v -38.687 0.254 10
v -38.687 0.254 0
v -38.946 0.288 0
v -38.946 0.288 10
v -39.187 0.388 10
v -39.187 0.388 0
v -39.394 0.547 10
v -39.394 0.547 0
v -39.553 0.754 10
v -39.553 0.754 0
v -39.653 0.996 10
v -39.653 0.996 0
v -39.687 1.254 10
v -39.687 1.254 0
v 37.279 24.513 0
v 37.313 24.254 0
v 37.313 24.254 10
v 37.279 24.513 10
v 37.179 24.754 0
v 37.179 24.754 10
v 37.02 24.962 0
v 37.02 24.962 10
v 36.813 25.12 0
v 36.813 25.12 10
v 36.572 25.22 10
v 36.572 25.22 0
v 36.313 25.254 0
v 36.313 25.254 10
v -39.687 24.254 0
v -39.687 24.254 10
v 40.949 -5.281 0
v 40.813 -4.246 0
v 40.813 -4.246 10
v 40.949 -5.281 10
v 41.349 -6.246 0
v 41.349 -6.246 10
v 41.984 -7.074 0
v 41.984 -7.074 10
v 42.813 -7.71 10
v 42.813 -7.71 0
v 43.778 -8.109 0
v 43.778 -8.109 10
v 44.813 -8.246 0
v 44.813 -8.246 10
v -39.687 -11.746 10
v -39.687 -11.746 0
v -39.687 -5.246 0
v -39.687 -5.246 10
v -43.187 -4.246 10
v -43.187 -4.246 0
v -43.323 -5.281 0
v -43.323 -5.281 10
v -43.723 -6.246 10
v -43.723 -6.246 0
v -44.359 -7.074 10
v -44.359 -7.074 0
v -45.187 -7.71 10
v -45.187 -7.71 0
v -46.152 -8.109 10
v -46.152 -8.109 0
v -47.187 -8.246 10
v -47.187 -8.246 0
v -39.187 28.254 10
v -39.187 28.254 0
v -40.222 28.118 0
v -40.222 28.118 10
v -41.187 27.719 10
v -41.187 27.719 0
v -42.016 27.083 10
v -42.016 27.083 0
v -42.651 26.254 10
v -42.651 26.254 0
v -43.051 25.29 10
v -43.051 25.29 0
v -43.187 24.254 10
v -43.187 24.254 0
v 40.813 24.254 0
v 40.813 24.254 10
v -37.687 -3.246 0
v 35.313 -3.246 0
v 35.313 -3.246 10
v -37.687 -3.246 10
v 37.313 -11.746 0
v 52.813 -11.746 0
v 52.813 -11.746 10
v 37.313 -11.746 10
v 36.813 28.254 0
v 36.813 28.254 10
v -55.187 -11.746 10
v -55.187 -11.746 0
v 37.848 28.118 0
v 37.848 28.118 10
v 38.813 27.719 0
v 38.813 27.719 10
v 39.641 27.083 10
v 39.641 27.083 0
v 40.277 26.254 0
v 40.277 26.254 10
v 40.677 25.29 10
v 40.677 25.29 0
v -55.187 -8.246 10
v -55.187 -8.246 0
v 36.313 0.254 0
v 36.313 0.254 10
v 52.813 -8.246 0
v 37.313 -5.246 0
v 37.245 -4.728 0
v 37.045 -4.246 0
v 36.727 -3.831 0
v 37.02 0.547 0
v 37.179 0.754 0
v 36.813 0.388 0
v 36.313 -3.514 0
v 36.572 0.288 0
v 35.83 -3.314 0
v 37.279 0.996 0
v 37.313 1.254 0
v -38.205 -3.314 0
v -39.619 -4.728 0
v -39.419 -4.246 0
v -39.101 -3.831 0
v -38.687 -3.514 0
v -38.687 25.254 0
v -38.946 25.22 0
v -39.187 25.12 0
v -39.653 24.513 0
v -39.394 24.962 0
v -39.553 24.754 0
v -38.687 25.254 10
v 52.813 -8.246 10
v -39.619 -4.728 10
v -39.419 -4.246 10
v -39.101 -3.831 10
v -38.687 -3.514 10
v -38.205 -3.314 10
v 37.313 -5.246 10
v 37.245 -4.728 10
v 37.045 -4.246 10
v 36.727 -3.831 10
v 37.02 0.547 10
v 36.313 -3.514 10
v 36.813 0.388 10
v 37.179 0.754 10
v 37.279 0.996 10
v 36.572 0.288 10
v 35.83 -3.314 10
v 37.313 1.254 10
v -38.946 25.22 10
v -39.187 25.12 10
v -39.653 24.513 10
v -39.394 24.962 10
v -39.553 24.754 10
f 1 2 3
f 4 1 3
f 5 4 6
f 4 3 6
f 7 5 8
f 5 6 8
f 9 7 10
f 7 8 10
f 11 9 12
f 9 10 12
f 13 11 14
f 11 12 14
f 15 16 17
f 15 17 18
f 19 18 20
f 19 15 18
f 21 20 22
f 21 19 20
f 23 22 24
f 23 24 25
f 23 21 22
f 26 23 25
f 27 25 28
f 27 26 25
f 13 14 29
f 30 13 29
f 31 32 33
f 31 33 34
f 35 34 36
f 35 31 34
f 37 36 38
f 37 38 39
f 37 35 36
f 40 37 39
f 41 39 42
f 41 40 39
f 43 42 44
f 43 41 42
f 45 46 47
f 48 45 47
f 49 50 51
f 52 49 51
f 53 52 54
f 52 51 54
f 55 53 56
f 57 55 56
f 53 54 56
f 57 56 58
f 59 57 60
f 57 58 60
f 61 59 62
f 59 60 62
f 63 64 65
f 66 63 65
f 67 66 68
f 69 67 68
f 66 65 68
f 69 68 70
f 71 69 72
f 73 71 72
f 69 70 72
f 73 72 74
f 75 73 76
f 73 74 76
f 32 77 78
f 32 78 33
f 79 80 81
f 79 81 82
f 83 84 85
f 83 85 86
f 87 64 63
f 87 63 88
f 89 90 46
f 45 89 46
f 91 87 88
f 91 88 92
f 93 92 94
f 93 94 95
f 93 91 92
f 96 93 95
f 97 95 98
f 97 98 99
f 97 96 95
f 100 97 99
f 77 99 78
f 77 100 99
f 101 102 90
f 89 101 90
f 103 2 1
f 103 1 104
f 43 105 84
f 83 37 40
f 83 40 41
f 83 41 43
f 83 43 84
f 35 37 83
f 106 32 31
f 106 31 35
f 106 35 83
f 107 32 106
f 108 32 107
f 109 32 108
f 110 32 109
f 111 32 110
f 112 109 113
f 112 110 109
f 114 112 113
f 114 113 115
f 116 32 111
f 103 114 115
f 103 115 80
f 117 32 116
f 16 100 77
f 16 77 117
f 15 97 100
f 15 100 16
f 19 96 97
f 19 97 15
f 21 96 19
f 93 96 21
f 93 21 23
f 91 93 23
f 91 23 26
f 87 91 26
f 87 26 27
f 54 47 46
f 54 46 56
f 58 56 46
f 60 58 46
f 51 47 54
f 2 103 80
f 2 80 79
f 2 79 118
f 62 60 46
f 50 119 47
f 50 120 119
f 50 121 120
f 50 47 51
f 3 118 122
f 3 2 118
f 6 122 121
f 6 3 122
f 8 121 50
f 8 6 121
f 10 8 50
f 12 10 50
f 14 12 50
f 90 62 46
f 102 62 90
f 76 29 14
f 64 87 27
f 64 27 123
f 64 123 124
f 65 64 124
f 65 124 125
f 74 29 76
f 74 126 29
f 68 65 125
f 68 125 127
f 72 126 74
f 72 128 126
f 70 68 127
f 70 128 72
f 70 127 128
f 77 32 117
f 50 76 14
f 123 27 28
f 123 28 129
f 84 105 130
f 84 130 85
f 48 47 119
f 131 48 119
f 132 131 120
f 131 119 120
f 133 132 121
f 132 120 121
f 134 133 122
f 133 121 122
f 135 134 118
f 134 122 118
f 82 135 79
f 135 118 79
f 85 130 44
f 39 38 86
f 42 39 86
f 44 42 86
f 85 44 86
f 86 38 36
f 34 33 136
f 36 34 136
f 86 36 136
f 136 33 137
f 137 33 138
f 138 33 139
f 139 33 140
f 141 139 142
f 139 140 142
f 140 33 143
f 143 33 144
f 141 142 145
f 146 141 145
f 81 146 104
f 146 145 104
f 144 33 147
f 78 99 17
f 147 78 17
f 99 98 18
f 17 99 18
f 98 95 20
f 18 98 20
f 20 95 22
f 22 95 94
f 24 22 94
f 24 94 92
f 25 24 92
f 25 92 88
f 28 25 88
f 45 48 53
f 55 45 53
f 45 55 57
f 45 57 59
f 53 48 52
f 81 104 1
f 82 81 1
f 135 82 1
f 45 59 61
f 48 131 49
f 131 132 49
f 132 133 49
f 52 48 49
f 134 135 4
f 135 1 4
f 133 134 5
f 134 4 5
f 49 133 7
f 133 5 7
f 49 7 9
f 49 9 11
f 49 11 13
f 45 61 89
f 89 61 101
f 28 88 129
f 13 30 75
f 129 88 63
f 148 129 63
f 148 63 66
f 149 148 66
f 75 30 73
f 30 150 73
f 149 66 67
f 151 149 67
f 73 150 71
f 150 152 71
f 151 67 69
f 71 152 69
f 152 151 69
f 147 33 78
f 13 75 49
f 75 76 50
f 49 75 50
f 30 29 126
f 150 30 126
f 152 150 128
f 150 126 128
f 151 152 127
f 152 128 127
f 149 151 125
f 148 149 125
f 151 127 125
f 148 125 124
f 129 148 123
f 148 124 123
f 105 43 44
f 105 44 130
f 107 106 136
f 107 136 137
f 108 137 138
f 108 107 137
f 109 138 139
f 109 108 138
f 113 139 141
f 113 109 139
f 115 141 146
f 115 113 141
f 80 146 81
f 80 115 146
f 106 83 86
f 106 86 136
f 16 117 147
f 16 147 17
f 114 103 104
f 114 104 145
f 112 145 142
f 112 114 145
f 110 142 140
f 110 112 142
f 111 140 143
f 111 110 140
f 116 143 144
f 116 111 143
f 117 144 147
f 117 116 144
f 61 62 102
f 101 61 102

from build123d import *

# Parameters (mm, degrees)
SALIENTE_EXTRUIR2_DEPTH = 10


with BuildPart() as part:
    # Croquis1 → Saliente-Extruir2 (new body)
    with BuildSketch(Plane.XY):
        with BuildLine():
            ThreePointArc((-38.687161159, 0.254415054), (-39.39426794, 0.547308273), (-39.687161159, 1.254415054))
            Line((-39.687161159, 1.254415054), (-39.687161159, 24.254415054))
            ThreePointArc((-39.687161159, 24.254415054), (-39.39426794, 24.961521836), (-38.687161159, 25.254415054))
            Line((-38.687161159, 25.254415054), (-1.187161159, 25.254415054))
            Line((-1.187161159, 25.254415054), (-1.187161159, 28.254415054))
            Line((-1.187161159, 28.254415054), (-39.187161159, 28.254415054))
            ThreePointArc((-39.187161159, 28.254415054), (-42.015588284, 27.082842179), (-43.187161159, 24.254415054))
            Line((-43.187161159, 24.254415054), (-43.187161159, -3.245584946))
            Line((-43.187161159, -3.245584946), (-43.187161159, -4.245584946))
            ThreePointArc((-43.187161159, -4.245584946), (-44.358734034, -7.07401207), (-47.187161159, -8.245584946))
            Line((-47.187161159, -8.245584946), (-55.187161159, -8.245584946))
            Line((-55.187161159, -8.245584946), (-55.187161159, -11.745584946))
            Line((-55.187161159, -11.745584946), (-43.187161159, -11.745584946))
            Line((-43.187161159, -11.745584946), (-39.687161159, -11.745584946))
            Line((-39.687161159, -11.745584946), (-39.687161159, -5.245584946))
            ThreePointArc((-39.687161159, -5.245584946), (-39.101374721, -3.831371383), (-37.687161159, -3.245584946))
            Line((-37.687161159, -3.245584946), (-1.187161159, -3.245584946))
            Line((-1.187161159, -3.245584946), (-1.187161159, 0.254415054))
            Line((-1.187161159, 0.254415054), (-38.687161159, 0.254415054))
        make_face()
    saliente_extruir2 = extrude(amount=SALIENTE_EXTRUIR2_DEPTH)

    # Simetría2: Saliente-Extruir2 across plane
    add(saliente_extruir2.mirror(Plane(origin=(-1.187161159, 0, 10), x_dir=(0, 0, 1), z_dir=(-1, 0, 0))))


solid = part.part
